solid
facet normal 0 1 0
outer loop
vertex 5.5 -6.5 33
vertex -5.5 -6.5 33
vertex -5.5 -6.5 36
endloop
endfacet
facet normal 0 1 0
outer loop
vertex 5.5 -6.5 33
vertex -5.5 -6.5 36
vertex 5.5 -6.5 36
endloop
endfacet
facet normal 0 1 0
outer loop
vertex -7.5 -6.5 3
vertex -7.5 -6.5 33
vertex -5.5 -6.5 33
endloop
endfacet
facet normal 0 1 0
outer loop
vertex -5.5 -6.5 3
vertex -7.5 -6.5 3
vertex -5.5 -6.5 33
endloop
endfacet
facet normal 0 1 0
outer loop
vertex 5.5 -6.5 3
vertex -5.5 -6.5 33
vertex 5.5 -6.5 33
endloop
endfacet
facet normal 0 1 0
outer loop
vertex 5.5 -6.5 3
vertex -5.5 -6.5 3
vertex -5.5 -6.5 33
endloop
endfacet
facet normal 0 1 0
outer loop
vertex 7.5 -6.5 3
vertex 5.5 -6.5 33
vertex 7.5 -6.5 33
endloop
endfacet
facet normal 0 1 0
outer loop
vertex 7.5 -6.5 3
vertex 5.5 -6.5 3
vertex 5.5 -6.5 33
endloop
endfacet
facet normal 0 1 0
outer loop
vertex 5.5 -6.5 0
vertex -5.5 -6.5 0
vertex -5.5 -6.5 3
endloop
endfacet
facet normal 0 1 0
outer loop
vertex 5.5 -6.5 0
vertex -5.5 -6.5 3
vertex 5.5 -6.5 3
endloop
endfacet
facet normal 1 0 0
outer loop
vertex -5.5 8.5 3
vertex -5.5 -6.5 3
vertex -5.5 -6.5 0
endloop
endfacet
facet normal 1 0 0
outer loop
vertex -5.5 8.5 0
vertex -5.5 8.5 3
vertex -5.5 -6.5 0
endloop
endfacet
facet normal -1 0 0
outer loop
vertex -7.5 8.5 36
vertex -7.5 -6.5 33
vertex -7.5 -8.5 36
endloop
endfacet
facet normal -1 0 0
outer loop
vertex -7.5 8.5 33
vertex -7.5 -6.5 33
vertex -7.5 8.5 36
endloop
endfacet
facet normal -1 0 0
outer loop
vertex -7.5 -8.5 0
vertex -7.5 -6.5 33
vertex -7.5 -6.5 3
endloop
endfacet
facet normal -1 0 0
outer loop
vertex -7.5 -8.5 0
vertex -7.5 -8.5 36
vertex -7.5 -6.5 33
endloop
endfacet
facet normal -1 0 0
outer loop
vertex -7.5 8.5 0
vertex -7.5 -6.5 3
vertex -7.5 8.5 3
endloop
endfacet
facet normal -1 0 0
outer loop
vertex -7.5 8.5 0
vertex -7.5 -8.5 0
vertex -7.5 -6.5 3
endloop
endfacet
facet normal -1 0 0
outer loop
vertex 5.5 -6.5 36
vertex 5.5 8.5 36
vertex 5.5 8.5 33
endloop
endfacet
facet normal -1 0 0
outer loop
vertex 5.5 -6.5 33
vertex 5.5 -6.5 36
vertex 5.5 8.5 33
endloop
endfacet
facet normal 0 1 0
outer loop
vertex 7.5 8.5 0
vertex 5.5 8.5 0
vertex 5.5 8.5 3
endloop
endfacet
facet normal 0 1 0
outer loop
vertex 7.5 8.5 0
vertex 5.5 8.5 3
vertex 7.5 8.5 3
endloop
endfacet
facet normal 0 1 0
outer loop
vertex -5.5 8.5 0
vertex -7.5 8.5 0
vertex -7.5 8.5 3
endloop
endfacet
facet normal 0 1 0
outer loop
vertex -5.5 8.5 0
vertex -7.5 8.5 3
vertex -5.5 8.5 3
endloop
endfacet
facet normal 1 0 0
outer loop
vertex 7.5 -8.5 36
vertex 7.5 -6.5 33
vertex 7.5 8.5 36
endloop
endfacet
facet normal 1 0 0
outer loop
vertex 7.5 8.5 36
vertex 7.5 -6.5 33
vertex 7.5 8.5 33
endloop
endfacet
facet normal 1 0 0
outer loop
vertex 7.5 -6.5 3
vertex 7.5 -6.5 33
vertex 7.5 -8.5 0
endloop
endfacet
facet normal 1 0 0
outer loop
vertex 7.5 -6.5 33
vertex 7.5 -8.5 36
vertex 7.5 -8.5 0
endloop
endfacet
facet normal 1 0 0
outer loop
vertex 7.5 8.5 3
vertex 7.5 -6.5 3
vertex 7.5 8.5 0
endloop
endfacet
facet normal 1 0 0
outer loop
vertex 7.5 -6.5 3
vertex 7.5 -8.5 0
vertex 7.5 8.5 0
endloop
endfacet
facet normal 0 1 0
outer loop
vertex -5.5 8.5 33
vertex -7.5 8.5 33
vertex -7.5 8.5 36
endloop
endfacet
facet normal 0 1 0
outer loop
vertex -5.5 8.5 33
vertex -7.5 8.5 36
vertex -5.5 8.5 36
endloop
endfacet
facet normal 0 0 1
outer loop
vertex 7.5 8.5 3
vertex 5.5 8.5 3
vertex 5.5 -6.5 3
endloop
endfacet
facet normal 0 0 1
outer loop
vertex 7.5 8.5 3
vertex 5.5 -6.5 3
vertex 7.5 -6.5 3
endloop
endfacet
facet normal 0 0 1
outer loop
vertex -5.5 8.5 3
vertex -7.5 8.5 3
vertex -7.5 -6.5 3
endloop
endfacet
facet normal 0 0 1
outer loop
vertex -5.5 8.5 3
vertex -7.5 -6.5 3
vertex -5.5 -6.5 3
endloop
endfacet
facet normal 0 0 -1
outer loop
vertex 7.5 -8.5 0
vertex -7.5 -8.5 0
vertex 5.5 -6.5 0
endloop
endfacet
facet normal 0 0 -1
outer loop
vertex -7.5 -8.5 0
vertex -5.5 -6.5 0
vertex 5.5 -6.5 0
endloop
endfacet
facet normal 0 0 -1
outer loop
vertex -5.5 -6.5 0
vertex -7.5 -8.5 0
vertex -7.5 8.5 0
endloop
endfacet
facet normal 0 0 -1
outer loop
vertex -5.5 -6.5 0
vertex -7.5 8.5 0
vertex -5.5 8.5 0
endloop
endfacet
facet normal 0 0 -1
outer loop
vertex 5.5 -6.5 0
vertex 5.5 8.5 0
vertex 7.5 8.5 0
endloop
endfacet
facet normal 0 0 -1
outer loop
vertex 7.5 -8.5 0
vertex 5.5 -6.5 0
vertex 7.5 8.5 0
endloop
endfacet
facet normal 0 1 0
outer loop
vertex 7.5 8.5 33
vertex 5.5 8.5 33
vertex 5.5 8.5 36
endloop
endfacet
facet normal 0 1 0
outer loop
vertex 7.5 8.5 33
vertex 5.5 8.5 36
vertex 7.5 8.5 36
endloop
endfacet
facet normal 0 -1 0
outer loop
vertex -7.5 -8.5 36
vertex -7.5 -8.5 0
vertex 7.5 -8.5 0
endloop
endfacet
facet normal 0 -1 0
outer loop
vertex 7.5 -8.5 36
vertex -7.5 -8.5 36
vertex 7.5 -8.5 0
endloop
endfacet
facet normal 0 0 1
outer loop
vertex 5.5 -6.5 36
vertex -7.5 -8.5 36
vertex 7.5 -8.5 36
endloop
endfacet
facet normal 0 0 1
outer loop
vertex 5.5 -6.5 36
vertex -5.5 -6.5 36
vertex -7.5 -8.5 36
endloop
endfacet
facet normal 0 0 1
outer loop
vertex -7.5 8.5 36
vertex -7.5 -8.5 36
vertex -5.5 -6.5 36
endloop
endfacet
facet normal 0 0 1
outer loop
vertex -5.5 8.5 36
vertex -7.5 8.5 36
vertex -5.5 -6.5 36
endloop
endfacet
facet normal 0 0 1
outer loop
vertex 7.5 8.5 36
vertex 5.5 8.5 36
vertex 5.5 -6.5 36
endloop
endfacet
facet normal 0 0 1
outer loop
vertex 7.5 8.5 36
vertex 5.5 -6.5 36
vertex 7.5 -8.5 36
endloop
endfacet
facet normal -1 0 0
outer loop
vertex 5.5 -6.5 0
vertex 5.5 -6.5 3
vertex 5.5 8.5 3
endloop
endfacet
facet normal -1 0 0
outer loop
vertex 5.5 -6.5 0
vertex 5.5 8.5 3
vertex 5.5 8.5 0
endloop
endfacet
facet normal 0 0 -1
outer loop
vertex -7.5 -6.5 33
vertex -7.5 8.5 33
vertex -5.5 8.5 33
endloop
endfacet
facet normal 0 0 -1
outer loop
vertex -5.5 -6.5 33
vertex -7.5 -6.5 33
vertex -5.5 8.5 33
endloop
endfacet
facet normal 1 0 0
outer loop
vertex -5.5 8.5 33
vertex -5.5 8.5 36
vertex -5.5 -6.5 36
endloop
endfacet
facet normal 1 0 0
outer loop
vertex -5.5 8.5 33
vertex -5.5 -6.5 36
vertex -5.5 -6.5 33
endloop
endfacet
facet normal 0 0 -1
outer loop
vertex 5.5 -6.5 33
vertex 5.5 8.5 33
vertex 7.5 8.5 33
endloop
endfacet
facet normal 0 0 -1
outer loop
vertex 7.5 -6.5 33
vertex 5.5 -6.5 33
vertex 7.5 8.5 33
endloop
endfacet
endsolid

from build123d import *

# Parameters (mm, degrees)
SKETCH1_W           = 15
SKETCH1_H           = 17
BOSS_EXTRUDE1_DEPTH = 36
SKETCH2_W           = 11
SKETCH2_H           = 36
CUT_EXTRUDE1_DEPTH  = 15
SKETCH3_W           = 15
SKETCH3_H           = 30
CUT_EXTRUDE2_DEPTH  = 15


with BuildPart() as part:
    # Sketch1 → Boss-Extrude1 (new body)
    with BuildSketch(Plane.XY):
        Rectangle(SKETCH1_W, SKETCH1_H)
    extrude(amount=BOSS_EXTRUDE1_DEPTH)

    # Sketch2 → Cut-Extrude1 (cut)
    with BuildSketch(Plane(origin=(0, 8.5, 0), x_dir=(1, 0, 0), z_dir=(0, 1, 0))):
        with Locations((0, -18)):
            Rectangle(SKETCH2_W, SKETCH2_H)
    extrude(amount=-CUT_EXTRUDE1_DEPTH, mode=Mode.SUBTRACT)

    # Sketch3 → Cut-Extrude2 (cut)
    with BuildSketch(Plane(origin=(0, 8.5, 0), x_dir=(1, 0, 0), z_dir=(0, 1, 0))):
        with Locations((0, -18)):
            Rectangle(SKETCH3_W, SKETCH3_H)
    extrude(amount=-CUT_EXTRUDE2_DEPTH, mode=Mode.SUBTRACT)


solid = part.part
